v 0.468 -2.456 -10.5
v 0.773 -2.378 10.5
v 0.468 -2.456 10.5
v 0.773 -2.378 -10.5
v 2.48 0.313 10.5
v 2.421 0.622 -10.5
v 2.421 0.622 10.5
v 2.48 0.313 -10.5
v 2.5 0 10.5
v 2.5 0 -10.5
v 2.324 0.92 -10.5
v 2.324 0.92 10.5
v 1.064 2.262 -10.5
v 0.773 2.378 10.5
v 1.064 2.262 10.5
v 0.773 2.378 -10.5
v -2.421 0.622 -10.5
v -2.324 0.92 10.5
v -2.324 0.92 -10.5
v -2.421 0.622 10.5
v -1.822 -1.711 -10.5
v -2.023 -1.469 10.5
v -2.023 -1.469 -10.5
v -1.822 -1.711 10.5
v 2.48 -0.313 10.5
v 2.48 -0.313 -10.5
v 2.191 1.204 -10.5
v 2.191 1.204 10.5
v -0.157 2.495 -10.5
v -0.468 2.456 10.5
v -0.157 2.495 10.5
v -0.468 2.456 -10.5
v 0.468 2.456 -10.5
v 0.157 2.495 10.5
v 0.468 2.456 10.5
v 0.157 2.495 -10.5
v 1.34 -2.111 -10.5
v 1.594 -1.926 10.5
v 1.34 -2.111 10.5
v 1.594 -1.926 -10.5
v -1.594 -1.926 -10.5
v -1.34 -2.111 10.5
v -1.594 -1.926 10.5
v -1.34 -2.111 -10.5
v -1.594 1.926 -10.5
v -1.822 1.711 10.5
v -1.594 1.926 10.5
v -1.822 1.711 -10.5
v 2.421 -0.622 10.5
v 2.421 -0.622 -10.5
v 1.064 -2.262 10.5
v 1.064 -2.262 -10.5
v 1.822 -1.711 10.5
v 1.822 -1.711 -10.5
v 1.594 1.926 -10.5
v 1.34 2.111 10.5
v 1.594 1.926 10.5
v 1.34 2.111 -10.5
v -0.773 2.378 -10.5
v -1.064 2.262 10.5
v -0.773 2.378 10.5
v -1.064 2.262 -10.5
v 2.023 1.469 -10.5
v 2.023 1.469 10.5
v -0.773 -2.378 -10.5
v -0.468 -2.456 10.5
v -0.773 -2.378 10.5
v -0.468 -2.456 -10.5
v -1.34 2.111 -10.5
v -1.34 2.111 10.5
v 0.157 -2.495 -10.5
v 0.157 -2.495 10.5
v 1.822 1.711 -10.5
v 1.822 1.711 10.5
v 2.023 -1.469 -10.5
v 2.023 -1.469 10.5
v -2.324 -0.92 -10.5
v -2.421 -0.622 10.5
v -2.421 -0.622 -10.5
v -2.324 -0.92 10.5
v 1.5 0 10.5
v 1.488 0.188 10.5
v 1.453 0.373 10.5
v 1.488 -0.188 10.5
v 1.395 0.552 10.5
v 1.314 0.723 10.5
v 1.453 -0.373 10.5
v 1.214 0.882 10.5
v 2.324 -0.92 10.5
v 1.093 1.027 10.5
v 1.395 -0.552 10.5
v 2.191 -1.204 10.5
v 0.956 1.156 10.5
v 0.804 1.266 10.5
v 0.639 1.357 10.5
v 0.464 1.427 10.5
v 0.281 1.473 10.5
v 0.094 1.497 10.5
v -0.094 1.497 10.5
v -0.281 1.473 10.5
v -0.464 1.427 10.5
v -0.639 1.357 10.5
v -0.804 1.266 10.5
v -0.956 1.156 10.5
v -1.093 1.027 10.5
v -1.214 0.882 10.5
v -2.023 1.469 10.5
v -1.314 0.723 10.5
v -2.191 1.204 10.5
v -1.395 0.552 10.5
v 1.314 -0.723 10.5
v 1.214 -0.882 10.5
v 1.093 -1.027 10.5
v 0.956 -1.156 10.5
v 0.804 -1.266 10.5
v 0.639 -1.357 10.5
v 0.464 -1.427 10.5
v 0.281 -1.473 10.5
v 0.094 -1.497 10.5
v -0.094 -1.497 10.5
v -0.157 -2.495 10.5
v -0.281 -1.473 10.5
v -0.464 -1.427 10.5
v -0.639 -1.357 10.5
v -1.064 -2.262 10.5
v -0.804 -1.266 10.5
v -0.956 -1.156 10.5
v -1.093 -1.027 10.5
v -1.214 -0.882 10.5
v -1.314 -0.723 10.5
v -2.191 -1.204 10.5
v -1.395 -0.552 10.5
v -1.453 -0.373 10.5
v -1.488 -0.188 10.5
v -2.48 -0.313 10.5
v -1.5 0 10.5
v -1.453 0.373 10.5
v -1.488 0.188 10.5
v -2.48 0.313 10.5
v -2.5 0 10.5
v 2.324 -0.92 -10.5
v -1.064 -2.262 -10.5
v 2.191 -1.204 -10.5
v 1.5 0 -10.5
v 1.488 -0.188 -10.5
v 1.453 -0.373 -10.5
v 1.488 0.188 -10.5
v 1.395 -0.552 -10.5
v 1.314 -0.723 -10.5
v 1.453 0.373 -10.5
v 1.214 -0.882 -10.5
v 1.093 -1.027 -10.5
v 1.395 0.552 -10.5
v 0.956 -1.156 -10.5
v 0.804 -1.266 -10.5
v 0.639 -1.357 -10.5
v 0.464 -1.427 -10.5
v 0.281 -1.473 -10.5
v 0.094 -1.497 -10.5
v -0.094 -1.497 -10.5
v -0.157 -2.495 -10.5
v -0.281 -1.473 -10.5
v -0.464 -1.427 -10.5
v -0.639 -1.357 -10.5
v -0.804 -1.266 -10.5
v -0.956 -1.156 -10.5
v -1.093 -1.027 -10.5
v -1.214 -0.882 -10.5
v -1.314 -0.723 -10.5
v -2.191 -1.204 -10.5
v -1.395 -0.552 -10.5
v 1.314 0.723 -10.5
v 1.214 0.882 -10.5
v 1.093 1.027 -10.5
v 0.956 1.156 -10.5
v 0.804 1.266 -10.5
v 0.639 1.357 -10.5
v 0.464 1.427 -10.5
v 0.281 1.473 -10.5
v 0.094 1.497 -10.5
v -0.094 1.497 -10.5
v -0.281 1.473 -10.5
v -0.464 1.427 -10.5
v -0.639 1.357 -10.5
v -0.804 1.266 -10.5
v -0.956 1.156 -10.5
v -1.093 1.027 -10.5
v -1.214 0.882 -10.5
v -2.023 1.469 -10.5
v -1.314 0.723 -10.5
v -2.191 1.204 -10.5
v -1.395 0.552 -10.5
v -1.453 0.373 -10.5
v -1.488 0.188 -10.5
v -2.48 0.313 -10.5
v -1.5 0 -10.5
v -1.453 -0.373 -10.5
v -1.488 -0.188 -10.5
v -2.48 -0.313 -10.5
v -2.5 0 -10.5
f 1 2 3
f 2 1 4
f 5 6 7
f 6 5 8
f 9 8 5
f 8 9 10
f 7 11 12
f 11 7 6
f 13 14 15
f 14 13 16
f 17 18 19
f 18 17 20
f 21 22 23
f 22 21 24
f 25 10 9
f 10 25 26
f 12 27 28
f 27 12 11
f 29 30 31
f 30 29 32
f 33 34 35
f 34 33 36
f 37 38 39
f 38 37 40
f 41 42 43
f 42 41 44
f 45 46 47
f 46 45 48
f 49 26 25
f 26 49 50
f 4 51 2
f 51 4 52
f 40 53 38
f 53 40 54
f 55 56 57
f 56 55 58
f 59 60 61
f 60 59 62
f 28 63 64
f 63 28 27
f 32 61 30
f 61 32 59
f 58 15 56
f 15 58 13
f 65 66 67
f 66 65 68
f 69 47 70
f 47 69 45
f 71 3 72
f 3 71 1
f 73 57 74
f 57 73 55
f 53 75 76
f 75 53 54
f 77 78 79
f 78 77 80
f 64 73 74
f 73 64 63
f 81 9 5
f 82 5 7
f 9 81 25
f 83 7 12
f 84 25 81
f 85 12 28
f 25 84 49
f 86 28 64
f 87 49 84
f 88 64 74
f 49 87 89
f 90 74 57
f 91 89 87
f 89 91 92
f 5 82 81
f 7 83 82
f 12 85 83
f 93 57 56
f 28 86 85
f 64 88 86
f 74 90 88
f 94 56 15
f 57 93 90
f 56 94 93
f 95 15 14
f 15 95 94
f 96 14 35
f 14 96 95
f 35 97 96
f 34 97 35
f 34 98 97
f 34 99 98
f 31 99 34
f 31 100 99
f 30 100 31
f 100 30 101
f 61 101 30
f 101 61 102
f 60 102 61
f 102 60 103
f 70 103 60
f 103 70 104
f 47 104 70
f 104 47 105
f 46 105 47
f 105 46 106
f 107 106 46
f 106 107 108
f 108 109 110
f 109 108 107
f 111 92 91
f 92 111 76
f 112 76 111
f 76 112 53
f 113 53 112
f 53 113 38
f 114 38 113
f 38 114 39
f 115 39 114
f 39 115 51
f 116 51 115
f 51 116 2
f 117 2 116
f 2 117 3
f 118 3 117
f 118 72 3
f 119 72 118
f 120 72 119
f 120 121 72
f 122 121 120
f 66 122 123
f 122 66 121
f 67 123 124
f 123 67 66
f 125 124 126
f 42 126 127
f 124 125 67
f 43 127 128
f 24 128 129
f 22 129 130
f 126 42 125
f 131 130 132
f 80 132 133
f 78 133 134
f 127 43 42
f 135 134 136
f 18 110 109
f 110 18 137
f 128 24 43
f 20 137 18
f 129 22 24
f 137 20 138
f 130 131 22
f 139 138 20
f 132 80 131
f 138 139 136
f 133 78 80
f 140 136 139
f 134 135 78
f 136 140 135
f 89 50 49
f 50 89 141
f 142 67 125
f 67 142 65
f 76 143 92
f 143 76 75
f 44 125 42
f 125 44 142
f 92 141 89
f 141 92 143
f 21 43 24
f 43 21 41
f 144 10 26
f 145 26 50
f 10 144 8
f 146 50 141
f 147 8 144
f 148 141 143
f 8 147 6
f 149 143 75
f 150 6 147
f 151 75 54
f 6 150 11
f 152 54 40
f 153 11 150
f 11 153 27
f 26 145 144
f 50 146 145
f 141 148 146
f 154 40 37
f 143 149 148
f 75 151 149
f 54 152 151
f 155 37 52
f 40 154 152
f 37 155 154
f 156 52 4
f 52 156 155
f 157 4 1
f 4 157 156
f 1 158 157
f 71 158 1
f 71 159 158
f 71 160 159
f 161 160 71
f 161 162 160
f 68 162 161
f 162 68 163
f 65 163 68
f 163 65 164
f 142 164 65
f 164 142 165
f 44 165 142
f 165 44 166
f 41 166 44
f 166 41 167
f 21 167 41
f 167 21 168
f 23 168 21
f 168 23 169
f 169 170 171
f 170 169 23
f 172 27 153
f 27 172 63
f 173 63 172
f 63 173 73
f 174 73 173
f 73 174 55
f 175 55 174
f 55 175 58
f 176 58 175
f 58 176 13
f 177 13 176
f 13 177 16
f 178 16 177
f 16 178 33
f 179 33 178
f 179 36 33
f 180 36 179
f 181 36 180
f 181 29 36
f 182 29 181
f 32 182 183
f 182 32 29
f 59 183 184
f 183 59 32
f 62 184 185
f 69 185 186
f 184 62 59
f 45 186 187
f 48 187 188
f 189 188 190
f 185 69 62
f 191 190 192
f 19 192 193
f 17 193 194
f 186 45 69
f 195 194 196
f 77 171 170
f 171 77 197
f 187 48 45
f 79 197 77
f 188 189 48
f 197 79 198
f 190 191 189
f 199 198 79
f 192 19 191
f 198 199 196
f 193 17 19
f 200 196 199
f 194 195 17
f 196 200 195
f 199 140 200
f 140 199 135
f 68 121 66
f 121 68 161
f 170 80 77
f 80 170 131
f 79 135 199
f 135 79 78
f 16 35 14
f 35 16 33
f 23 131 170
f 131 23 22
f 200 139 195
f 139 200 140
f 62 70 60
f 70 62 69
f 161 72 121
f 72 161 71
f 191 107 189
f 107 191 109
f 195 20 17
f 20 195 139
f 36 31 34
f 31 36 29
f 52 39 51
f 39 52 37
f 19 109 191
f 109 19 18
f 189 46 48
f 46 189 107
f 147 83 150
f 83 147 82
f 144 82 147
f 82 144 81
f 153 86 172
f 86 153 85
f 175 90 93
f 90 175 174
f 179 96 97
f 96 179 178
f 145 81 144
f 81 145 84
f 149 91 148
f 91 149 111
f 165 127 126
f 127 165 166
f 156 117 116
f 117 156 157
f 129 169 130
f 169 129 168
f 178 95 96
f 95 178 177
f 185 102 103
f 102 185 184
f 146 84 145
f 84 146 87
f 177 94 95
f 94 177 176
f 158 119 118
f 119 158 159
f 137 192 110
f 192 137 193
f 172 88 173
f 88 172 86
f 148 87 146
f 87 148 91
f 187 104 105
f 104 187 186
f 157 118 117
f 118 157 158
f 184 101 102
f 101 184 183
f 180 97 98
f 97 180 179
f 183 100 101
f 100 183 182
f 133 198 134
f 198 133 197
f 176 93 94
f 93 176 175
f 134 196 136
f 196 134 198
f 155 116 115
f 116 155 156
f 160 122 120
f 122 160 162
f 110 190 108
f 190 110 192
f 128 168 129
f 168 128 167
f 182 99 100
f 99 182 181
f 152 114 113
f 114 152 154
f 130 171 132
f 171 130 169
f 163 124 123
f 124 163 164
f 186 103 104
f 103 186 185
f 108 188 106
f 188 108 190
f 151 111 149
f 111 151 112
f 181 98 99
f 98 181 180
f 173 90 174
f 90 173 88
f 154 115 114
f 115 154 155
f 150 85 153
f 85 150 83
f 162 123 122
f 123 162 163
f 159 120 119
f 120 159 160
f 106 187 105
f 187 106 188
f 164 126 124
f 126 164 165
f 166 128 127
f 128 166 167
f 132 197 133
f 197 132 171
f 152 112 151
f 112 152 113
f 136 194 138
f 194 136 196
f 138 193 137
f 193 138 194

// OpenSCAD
$fn = 50;


difference() {
	union() {
		translate(v = [0, 0, -10.5000000000]) {
			cylinder(h = 21, r = 2.5000000000);
		}
	}
	union() {
		translate(v = [0, 0, -100.0000000000]) {
			cylinder(h = 200, r = 1.5000000000);
		}
	}
}
